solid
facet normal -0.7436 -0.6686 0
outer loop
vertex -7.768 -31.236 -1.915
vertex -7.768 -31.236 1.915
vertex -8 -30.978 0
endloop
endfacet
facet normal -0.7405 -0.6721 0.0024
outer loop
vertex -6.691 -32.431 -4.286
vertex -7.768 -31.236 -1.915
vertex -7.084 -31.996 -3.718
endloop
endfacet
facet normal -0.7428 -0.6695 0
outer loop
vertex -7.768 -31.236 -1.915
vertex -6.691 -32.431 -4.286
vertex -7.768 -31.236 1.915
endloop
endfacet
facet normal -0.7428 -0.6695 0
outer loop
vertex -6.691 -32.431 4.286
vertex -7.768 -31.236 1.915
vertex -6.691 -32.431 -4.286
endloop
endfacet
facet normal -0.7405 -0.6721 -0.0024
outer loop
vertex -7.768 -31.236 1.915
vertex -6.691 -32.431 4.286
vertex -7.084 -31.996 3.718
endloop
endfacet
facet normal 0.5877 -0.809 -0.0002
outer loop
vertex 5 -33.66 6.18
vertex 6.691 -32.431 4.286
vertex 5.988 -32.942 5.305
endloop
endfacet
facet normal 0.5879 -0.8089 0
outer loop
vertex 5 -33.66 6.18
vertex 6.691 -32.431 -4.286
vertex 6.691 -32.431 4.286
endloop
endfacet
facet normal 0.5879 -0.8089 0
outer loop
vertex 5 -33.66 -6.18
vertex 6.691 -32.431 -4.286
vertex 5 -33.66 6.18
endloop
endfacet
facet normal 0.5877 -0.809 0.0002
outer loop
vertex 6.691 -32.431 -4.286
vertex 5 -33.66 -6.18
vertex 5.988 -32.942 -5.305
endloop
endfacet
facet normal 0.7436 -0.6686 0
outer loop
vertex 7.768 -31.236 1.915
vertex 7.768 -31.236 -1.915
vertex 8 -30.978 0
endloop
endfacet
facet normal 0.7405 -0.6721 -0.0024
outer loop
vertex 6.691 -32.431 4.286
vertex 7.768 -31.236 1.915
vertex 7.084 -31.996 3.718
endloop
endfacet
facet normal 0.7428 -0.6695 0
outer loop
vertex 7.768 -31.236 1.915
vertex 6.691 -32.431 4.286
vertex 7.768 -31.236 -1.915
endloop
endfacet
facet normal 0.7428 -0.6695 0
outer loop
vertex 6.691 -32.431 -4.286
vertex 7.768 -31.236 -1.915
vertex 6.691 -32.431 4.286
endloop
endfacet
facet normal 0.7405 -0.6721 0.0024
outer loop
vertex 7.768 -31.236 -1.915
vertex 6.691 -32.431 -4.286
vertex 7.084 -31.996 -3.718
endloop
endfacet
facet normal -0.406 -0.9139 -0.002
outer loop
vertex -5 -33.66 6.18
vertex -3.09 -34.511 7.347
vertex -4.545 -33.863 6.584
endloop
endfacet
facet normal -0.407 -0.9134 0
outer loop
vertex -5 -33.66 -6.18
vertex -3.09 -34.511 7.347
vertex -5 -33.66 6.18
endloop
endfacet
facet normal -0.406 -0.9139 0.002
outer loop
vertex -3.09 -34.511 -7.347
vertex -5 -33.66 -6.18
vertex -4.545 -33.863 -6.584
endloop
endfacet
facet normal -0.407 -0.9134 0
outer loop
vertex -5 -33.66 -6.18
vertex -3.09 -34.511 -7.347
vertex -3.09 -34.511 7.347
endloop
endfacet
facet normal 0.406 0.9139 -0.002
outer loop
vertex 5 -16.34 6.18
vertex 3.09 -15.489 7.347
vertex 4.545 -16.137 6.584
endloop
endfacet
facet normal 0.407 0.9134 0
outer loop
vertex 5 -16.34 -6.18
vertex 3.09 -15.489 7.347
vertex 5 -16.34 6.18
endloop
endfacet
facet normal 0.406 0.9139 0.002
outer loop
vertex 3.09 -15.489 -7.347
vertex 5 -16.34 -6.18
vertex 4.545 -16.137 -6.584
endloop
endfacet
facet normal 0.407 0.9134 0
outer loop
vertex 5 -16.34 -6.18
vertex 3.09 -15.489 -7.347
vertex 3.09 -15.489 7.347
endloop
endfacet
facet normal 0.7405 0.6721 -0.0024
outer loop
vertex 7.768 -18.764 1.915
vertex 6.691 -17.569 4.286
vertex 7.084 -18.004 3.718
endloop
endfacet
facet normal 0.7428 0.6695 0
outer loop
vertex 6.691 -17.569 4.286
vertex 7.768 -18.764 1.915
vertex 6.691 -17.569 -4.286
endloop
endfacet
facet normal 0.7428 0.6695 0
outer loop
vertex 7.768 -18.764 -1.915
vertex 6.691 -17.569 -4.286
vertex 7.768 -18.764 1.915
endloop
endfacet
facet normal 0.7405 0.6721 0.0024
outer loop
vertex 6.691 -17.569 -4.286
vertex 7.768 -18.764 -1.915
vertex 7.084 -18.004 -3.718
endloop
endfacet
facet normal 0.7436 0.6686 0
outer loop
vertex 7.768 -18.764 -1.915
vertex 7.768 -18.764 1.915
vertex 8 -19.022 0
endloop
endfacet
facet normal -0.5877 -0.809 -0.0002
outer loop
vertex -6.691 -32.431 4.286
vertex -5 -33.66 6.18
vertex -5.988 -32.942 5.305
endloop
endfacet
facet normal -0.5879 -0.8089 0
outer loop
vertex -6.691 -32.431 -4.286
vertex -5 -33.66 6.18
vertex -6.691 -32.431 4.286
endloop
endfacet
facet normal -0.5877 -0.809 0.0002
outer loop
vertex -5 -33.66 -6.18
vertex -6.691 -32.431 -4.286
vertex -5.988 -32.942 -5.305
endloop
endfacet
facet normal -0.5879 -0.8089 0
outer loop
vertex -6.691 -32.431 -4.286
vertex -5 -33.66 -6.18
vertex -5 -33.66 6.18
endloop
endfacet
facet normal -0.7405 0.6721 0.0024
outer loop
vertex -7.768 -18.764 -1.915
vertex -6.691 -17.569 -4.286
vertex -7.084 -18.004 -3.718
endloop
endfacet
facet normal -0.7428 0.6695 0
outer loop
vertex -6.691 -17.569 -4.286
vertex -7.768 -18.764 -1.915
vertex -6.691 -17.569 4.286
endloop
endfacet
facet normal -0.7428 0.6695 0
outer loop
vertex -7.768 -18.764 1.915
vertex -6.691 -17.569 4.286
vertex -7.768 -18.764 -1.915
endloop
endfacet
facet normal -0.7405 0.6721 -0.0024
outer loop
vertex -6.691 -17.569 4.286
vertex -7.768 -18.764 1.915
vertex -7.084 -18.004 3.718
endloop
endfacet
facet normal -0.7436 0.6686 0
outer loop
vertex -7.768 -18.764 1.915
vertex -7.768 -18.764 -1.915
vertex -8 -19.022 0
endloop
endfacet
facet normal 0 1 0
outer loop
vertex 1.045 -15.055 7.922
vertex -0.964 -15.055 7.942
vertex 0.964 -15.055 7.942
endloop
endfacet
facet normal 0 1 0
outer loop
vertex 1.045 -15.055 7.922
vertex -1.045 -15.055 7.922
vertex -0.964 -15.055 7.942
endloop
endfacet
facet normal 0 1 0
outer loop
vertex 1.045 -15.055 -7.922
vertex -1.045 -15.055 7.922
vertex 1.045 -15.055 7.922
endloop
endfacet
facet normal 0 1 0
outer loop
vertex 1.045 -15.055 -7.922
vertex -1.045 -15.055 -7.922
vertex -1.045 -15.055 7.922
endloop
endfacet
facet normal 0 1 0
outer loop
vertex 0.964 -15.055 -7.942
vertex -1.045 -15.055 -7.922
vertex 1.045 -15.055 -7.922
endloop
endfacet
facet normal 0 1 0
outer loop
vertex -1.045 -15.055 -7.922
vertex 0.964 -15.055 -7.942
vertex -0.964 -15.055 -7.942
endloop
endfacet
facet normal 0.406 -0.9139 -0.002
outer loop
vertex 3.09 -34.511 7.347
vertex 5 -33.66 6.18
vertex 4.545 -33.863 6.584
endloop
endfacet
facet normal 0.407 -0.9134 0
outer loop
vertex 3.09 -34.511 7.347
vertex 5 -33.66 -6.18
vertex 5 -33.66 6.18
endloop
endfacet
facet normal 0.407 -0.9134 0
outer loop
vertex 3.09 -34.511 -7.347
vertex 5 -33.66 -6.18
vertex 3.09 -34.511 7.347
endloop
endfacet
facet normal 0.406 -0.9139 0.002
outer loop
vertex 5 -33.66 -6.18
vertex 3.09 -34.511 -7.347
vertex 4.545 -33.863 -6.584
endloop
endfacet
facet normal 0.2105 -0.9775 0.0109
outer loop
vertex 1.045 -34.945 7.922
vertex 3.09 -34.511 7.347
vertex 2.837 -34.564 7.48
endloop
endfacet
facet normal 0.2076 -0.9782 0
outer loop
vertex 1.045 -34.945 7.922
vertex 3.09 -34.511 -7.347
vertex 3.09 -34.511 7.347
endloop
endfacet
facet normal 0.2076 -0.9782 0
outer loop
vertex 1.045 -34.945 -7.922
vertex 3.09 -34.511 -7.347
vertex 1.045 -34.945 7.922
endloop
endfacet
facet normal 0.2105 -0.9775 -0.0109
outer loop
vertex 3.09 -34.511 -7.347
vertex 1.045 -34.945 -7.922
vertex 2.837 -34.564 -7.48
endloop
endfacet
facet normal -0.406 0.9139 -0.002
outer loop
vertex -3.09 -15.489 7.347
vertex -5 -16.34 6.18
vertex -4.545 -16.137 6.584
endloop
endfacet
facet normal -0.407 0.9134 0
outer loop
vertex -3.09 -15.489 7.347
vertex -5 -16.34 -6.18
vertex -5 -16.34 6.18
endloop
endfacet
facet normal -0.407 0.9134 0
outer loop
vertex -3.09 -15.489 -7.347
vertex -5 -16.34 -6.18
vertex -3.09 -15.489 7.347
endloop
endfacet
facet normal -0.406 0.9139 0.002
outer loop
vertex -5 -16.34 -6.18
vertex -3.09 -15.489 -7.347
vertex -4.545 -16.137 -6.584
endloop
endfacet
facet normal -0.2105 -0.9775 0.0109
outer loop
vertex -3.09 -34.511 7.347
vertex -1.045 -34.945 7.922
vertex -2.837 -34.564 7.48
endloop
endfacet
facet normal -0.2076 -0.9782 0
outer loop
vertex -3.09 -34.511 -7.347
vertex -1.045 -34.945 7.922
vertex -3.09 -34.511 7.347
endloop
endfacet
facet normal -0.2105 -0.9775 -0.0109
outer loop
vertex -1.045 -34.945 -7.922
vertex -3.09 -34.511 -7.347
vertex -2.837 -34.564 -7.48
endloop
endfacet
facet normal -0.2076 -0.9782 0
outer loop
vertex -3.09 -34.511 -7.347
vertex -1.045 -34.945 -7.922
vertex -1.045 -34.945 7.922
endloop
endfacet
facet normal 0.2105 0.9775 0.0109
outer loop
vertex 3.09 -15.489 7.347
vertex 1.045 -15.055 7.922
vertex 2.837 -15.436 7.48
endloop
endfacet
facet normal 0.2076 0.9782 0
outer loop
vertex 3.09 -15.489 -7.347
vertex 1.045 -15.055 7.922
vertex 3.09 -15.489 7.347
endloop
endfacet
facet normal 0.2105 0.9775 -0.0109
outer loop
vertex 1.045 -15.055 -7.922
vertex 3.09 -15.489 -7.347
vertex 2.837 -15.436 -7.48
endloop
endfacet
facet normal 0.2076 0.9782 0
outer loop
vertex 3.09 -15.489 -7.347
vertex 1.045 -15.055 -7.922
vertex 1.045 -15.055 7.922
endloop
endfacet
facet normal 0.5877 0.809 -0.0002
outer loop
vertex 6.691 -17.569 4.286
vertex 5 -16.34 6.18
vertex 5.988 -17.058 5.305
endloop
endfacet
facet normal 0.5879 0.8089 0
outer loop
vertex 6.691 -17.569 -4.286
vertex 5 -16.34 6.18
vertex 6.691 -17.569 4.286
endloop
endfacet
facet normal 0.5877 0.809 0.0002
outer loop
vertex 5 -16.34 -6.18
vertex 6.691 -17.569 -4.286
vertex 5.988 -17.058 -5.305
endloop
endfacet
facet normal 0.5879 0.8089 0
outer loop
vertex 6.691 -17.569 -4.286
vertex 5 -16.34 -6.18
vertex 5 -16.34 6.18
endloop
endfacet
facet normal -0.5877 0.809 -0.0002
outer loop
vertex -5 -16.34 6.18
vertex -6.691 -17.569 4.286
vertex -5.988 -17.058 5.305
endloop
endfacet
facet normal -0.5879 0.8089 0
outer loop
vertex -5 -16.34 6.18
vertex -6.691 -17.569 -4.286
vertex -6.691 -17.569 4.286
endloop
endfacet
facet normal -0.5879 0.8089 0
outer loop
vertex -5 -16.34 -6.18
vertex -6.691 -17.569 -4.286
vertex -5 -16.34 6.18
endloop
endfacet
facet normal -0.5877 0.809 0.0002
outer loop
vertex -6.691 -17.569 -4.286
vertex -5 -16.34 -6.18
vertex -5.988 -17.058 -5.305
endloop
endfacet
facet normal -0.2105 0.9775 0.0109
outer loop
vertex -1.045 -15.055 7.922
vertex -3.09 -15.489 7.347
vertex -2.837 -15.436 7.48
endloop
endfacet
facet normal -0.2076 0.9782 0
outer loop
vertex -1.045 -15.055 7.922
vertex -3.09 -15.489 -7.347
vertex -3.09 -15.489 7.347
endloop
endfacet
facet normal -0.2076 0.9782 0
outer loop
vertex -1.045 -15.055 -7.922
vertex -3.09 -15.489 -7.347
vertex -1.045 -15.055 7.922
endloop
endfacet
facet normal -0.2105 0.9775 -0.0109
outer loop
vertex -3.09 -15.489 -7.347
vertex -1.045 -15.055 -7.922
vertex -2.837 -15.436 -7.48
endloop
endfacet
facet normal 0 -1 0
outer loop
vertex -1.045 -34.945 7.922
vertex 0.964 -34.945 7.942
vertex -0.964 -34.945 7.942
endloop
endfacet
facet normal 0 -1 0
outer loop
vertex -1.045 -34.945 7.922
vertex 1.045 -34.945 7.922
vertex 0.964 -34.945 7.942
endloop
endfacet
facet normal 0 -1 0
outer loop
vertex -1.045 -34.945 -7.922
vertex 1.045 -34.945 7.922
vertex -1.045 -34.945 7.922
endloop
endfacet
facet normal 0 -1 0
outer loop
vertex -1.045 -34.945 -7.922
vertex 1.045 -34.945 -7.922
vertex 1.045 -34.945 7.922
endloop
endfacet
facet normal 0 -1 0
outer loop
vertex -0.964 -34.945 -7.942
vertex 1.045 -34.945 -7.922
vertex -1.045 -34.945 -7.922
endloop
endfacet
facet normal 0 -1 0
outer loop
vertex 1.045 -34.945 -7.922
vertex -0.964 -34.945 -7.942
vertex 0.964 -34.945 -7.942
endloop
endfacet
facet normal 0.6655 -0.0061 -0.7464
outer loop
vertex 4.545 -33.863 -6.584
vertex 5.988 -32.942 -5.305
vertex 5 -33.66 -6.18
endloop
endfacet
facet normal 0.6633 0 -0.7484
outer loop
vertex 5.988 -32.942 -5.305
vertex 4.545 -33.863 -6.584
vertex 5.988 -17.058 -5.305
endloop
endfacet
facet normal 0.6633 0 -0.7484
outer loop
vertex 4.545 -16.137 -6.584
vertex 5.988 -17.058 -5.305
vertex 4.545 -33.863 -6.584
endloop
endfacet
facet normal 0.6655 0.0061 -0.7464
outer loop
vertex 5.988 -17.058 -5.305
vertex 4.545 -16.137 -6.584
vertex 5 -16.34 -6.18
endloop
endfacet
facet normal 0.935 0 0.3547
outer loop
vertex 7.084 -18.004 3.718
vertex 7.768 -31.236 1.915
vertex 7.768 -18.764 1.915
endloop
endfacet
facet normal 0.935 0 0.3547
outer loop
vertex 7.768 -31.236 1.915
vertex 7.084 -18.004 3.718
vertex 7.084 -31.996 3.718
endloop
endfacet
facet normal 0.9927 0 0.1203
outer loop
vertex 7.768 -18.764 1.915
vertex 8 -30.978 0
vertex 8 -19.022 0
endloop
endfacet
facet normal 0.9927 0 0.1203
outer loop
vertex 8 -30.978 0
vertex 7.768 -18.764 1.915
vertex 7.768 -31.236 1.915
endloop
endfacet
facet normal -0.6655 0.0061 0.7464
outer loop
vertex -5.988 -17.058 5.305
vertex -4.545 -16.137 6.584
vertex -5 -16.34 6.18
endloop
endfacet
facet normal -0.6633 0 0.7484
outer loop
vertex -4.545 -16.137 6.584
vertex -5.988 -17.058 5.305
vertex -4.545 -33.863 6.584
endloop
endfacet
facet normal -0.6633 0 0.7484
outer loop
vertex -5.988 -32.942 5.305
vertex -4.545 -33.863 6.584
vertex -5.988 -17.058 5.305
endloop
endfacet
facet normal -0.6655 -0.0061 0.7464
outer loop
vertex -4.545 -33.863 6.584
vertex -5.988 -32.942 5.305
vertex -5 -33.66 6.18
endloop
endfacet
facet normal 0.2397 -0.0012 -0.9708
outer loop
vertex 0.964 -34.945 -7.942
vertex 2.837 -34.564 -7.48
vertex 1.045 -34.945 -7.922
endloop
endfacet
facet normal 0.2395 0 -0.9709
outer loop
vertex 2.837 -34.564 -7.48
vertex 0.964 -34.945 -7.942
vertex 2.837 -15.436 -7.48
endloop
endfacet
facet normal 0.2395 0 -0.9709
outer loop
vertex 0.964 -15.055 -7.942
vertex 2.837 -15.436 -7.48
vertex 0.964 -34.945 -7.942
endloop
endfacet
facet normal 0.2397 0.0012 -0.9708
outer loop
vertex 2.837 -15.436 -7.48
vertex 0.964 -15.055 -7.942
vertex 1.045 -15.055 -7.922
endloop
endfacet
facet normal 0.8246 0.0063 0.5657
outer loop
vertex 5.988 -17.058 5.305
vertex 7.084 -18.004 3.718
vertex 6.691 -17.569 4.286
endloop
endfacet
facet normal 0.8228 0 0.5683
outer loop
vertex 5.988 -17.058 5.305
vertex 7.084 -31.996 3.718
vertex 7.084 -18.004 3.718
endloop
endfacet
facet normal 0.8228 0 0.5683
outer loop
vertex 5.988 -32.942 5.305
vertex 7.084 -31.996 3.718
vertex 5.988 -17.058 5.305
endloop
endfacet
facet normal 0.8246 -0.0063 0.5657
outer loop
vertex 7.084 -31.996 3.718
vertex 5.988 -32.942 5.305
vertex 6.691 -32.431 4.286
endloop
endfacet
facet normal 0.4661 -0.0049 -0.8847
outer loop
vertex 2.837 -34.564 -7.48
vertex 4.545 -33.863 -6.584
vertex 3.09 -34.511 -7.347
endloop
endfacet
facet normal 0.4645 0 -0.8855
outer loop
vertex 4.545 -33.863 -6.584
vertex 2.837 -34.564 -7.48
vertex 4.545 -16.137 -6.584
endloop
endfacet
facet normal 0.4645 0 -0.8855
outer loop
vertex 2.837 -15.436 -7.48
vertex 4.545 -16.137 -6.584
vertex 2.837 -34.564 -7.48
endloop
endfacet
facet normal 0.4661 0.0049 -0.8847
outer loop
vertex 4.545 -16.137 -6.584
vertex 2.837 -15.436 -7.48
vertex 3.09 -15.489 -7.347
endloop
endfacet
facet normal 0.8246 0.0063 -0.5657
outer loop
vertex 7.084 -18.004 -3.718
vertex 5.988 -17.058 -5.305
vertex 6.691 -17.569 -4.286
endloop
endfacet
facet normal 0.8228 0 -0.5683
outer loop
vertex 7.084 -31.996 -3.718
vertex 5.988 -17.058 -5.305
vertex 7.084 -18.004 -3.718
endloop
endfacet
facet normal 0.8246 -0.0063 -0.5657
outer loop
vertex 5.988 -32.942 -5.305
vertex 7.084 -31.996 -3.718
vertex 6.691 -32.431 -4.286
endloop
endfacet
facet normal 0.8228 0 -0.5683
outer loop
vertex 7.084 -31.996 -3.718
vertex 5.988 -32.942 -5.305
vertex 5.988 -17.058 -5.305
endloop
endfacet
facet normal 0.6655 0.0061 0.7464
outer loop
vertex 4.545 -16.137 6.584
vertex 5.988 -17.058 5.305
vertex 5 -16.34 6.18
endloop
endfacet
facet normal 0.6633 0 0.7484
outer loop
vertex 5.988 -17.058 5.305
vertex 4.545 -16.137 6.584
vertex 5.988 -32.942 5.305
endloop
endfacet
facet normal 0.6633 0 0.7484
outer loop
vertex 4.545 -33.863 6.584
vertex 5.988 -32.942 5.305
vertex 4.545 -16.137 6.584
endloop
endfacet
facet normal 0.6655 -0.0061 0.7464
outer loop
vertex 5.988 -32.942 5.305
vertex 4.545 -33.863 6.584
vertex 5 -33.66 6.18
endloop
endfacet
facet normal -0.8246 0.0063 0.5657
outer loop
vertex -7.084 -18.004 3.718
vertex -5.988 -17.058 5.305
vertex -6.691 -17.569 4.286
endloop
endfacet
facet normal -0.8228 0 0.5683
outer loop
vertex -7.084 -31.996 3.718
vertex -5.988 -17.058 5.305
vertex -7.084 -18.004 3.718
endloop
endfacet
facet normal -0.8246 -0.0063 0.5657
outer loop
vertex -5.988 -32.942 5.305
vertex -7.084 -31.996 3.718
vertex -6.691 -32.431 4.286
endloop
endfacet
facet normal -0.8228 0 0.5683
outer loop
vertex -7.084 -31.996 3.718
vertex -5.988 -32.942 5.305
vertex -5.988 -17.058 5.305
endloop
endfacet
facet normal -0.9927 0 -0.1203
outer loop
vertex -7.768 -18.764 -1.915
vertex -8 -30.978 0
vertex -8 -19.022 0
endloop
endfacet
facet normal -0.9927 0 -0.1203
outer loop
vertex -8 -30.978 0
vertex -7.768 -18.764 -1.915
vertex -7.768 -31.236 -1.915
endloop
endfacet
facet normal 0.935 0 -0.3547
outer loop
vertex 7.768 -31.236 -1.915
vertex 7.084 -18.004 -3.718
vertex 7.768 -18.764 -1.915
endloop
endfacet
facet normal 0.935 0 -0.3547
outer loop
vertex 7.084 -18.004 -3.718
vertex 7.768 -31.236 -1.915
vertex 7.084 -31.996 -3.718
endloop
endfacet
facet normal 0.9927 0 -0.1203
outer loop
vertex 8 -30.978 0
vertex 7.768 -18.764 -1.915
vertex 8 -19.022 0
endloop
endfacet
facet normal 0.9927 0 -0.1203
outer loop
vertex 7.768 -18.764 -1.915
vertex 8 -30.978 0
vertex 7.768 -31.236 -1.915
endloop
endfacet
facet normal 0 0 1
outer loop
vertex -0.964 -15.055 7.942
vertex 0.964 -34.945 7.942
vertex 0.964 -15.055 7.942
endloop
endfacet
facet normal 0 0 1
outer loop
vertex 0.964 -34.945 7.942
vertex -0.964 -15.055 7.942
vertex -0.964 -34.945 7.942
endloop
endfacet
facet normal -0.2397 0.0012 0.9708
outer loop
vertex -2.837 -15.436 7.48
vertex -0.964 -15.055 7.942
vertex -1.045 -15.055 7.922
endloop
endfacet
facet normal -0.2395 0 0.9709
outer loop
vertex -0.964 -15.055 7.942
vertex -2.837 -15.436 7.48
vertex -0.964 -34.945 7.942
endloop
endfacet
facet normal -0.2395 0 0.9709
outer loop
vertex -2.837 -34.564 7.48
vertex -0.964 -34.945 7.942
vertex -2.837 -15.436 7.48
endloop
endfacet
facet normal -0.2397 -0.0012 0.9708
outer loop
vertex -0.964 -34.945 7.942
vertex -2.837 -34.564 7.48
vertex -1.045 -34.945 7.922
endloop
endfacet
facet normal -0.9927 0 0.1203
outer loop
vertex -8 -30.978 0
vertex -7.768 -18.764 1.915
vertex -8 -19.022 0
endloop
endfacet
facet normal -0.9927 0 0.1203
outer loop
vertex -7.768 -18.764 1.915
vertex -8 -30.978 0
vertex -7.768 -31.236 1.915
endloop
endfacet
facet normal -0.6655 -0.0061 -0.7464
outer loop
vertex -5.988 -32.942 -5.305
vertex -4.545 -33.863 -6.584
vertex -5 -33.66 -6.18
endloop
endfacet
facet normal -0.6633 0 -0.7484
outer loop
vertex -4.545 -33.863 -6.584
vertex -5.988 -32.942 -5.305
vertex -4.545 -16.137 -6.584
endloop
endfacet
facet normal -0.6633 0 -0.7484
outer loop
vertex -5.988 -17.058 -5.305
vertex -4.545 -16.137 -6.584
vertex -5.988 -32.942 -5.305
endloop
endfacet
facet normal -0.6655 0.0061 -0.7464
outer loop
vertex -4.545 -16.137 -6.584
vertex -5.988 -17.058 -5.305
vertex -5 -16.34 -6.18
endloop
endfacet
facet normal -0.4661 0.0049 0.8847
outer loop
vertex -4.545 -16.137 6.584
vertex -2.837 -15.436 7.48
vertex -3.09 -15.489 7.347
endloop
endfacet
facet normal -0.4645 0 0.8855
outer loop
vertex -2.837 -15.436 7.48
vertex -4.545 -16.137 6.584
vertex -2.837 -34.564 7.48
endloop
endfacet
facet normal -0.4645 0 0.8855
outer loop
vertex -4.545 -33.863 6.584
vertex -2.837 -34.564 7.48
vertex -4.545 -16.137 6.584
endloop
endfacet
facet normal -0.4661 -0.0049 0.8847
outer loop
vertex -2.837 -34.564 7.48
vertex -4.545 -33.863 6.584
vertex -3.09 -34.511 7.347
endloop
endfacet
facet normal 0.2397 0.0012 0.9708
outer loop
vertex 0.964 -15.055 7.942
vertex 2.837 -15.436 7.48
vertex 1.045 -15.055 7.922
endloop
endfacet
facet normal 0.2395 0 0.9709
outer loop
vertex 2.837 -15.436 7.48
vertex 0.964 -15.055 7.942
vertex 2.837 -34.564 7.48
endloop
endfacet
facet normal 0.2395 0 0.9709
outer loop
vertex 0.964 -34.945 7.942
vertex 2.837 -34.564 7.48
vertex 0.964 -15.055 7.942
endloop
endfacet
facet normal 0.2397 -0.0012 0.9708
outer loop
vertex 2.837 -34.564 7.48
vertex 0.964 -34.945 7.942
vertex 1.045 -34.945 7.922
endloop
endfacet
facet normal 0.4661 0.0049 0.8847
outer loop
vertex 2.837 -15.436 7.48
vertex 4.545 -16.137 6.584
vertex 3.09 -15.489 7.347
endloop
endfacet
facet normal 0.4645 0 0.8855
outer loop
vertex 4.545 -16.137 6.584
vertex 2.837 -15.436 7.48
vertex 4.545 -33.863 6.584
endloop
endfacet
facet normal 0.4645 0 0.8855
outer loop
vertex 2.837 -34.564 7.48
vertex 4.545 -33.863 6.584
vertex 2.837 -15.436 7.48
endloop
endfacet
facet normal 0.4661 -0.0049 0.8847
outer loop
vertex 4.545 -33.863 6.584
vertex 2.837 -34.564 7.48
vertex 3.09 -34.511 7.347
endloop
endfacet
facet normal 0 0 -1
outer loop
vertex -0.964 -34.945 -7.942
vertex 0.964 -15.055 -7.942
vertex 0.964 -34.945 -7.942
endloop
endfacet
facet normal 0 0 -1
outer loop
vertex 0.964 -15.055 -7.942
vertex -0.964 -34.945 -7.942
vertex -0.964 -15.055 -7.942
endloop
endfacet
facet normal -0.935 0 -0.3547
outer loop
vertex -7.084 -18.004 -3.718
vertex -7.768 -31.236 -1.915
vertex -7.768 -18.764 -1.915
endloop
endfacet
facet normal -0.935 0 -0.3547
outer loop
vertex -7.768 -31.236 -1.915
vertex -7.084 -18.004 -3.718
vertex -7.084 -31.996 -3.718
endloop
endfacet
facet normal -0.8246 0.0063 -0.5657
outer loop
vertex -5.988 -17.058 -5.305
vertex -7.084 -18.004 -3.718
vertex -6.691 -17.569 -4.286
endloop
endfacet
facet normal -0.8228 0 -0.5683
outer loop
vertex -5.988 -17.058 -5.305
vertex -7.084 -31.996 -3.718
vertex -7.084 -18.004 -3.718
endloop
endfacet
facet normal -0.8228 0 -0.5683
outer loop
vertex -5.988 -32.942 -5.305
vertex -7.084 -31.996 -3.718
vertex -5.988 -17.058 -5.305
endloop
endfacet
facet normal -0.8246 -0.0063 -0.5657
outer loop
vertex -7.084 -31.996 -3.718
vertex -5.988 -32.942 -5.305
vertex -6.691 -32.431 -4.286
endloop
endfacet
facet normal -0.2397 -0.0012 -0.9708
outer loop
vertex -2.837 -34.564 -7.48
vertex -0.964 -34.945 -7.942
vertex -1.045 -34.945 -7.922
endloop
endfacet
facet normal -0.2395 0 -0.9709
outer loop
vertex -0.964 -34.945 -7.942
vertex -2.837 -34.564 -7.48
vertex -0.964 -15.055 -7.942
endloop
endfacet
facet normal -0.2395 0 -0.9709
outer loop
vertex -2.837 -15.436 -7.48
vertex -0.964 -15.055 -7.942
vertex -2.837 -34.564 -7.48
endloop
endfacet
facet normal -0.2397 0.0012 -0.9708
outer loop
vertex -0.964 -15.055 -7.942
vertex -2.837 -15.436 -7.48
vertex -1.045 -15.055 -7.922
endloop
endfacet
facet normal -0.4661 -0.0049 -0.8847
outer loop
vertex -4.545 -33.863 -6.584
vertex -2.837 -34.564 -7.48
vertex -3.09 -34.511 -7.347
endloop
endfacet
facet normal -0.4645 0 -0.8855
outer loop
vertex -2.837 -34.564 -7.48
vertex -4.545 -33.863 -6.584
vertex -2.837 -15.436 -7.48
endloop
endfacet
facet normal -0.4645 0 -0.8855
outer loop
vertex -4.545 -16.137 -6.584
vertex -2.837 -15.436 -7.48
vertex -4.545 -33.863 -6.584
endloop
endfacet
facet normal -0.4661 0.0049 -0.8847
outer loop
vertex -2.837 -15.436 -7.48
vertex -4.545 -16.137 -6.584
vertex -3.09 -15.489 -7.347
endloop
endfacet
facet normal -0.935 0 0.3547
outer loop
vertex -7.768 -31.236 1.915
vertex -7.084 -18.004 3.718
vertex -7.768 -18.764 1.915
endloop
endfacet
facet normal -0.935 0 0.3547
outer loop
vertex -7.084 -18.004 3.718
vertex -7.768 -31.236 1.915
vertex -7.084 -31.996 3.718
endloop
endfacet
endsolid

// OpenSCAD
module test()
{
// square([4,16]);	
// polygon([ [0,0],[5,0],[5,5],[0,5] ], [ [0,1,2,3] ]);
// sphere(6);
// cylinder(h=20, r1=5, r2=0);
// cube([4,8,16]);

// relocate part
// translate([10,20,30]) cube(5);

// rotate part
// rotate([90,0,0]) cube([4,8,16.5]);

// scale part
// scale([2,1,1]) sphere(5); //makes an ellipical sphere

// overlapping parts
// translate([0,-25,-25]) cylinder(50,10,10);
// rotate([90,0,0]) cylinder(50,8,8);

// removing sections
// difference() 
// {
// 	translate([0,-25,-25]) cylinder(50,10,10); //form to subtract from 
// 	rotate([90,0,0]) cylinder(50,8,8); //section to remove
// }

// fetch overlap
intersection()
{
	translate([0,-25,-25]) cylinder(50,10,10);
	rotate([90,0,0]) cylinder(50,8,8);
}

// merged parts
// union()
// {
	// translate([0,-25,-25]) cylinder(50,10,10);
	// rotate([90,0,0]) cylinder(50,8,8);
// }

// union()
// {
// rotate([180,0,0]) scale([0.05, 0.05, 0.15]) import("/Users/favery/Downloads/dplogo.stl");
// import("/Users/favery/Downloads/servo_fixed.stl");
// translate([13.5,-2,-26.5]) cube([3.3,4,13]);
// translate([-16.5,-2,-26.5]) cube([3.3,4,13]);
// }

}


test();
